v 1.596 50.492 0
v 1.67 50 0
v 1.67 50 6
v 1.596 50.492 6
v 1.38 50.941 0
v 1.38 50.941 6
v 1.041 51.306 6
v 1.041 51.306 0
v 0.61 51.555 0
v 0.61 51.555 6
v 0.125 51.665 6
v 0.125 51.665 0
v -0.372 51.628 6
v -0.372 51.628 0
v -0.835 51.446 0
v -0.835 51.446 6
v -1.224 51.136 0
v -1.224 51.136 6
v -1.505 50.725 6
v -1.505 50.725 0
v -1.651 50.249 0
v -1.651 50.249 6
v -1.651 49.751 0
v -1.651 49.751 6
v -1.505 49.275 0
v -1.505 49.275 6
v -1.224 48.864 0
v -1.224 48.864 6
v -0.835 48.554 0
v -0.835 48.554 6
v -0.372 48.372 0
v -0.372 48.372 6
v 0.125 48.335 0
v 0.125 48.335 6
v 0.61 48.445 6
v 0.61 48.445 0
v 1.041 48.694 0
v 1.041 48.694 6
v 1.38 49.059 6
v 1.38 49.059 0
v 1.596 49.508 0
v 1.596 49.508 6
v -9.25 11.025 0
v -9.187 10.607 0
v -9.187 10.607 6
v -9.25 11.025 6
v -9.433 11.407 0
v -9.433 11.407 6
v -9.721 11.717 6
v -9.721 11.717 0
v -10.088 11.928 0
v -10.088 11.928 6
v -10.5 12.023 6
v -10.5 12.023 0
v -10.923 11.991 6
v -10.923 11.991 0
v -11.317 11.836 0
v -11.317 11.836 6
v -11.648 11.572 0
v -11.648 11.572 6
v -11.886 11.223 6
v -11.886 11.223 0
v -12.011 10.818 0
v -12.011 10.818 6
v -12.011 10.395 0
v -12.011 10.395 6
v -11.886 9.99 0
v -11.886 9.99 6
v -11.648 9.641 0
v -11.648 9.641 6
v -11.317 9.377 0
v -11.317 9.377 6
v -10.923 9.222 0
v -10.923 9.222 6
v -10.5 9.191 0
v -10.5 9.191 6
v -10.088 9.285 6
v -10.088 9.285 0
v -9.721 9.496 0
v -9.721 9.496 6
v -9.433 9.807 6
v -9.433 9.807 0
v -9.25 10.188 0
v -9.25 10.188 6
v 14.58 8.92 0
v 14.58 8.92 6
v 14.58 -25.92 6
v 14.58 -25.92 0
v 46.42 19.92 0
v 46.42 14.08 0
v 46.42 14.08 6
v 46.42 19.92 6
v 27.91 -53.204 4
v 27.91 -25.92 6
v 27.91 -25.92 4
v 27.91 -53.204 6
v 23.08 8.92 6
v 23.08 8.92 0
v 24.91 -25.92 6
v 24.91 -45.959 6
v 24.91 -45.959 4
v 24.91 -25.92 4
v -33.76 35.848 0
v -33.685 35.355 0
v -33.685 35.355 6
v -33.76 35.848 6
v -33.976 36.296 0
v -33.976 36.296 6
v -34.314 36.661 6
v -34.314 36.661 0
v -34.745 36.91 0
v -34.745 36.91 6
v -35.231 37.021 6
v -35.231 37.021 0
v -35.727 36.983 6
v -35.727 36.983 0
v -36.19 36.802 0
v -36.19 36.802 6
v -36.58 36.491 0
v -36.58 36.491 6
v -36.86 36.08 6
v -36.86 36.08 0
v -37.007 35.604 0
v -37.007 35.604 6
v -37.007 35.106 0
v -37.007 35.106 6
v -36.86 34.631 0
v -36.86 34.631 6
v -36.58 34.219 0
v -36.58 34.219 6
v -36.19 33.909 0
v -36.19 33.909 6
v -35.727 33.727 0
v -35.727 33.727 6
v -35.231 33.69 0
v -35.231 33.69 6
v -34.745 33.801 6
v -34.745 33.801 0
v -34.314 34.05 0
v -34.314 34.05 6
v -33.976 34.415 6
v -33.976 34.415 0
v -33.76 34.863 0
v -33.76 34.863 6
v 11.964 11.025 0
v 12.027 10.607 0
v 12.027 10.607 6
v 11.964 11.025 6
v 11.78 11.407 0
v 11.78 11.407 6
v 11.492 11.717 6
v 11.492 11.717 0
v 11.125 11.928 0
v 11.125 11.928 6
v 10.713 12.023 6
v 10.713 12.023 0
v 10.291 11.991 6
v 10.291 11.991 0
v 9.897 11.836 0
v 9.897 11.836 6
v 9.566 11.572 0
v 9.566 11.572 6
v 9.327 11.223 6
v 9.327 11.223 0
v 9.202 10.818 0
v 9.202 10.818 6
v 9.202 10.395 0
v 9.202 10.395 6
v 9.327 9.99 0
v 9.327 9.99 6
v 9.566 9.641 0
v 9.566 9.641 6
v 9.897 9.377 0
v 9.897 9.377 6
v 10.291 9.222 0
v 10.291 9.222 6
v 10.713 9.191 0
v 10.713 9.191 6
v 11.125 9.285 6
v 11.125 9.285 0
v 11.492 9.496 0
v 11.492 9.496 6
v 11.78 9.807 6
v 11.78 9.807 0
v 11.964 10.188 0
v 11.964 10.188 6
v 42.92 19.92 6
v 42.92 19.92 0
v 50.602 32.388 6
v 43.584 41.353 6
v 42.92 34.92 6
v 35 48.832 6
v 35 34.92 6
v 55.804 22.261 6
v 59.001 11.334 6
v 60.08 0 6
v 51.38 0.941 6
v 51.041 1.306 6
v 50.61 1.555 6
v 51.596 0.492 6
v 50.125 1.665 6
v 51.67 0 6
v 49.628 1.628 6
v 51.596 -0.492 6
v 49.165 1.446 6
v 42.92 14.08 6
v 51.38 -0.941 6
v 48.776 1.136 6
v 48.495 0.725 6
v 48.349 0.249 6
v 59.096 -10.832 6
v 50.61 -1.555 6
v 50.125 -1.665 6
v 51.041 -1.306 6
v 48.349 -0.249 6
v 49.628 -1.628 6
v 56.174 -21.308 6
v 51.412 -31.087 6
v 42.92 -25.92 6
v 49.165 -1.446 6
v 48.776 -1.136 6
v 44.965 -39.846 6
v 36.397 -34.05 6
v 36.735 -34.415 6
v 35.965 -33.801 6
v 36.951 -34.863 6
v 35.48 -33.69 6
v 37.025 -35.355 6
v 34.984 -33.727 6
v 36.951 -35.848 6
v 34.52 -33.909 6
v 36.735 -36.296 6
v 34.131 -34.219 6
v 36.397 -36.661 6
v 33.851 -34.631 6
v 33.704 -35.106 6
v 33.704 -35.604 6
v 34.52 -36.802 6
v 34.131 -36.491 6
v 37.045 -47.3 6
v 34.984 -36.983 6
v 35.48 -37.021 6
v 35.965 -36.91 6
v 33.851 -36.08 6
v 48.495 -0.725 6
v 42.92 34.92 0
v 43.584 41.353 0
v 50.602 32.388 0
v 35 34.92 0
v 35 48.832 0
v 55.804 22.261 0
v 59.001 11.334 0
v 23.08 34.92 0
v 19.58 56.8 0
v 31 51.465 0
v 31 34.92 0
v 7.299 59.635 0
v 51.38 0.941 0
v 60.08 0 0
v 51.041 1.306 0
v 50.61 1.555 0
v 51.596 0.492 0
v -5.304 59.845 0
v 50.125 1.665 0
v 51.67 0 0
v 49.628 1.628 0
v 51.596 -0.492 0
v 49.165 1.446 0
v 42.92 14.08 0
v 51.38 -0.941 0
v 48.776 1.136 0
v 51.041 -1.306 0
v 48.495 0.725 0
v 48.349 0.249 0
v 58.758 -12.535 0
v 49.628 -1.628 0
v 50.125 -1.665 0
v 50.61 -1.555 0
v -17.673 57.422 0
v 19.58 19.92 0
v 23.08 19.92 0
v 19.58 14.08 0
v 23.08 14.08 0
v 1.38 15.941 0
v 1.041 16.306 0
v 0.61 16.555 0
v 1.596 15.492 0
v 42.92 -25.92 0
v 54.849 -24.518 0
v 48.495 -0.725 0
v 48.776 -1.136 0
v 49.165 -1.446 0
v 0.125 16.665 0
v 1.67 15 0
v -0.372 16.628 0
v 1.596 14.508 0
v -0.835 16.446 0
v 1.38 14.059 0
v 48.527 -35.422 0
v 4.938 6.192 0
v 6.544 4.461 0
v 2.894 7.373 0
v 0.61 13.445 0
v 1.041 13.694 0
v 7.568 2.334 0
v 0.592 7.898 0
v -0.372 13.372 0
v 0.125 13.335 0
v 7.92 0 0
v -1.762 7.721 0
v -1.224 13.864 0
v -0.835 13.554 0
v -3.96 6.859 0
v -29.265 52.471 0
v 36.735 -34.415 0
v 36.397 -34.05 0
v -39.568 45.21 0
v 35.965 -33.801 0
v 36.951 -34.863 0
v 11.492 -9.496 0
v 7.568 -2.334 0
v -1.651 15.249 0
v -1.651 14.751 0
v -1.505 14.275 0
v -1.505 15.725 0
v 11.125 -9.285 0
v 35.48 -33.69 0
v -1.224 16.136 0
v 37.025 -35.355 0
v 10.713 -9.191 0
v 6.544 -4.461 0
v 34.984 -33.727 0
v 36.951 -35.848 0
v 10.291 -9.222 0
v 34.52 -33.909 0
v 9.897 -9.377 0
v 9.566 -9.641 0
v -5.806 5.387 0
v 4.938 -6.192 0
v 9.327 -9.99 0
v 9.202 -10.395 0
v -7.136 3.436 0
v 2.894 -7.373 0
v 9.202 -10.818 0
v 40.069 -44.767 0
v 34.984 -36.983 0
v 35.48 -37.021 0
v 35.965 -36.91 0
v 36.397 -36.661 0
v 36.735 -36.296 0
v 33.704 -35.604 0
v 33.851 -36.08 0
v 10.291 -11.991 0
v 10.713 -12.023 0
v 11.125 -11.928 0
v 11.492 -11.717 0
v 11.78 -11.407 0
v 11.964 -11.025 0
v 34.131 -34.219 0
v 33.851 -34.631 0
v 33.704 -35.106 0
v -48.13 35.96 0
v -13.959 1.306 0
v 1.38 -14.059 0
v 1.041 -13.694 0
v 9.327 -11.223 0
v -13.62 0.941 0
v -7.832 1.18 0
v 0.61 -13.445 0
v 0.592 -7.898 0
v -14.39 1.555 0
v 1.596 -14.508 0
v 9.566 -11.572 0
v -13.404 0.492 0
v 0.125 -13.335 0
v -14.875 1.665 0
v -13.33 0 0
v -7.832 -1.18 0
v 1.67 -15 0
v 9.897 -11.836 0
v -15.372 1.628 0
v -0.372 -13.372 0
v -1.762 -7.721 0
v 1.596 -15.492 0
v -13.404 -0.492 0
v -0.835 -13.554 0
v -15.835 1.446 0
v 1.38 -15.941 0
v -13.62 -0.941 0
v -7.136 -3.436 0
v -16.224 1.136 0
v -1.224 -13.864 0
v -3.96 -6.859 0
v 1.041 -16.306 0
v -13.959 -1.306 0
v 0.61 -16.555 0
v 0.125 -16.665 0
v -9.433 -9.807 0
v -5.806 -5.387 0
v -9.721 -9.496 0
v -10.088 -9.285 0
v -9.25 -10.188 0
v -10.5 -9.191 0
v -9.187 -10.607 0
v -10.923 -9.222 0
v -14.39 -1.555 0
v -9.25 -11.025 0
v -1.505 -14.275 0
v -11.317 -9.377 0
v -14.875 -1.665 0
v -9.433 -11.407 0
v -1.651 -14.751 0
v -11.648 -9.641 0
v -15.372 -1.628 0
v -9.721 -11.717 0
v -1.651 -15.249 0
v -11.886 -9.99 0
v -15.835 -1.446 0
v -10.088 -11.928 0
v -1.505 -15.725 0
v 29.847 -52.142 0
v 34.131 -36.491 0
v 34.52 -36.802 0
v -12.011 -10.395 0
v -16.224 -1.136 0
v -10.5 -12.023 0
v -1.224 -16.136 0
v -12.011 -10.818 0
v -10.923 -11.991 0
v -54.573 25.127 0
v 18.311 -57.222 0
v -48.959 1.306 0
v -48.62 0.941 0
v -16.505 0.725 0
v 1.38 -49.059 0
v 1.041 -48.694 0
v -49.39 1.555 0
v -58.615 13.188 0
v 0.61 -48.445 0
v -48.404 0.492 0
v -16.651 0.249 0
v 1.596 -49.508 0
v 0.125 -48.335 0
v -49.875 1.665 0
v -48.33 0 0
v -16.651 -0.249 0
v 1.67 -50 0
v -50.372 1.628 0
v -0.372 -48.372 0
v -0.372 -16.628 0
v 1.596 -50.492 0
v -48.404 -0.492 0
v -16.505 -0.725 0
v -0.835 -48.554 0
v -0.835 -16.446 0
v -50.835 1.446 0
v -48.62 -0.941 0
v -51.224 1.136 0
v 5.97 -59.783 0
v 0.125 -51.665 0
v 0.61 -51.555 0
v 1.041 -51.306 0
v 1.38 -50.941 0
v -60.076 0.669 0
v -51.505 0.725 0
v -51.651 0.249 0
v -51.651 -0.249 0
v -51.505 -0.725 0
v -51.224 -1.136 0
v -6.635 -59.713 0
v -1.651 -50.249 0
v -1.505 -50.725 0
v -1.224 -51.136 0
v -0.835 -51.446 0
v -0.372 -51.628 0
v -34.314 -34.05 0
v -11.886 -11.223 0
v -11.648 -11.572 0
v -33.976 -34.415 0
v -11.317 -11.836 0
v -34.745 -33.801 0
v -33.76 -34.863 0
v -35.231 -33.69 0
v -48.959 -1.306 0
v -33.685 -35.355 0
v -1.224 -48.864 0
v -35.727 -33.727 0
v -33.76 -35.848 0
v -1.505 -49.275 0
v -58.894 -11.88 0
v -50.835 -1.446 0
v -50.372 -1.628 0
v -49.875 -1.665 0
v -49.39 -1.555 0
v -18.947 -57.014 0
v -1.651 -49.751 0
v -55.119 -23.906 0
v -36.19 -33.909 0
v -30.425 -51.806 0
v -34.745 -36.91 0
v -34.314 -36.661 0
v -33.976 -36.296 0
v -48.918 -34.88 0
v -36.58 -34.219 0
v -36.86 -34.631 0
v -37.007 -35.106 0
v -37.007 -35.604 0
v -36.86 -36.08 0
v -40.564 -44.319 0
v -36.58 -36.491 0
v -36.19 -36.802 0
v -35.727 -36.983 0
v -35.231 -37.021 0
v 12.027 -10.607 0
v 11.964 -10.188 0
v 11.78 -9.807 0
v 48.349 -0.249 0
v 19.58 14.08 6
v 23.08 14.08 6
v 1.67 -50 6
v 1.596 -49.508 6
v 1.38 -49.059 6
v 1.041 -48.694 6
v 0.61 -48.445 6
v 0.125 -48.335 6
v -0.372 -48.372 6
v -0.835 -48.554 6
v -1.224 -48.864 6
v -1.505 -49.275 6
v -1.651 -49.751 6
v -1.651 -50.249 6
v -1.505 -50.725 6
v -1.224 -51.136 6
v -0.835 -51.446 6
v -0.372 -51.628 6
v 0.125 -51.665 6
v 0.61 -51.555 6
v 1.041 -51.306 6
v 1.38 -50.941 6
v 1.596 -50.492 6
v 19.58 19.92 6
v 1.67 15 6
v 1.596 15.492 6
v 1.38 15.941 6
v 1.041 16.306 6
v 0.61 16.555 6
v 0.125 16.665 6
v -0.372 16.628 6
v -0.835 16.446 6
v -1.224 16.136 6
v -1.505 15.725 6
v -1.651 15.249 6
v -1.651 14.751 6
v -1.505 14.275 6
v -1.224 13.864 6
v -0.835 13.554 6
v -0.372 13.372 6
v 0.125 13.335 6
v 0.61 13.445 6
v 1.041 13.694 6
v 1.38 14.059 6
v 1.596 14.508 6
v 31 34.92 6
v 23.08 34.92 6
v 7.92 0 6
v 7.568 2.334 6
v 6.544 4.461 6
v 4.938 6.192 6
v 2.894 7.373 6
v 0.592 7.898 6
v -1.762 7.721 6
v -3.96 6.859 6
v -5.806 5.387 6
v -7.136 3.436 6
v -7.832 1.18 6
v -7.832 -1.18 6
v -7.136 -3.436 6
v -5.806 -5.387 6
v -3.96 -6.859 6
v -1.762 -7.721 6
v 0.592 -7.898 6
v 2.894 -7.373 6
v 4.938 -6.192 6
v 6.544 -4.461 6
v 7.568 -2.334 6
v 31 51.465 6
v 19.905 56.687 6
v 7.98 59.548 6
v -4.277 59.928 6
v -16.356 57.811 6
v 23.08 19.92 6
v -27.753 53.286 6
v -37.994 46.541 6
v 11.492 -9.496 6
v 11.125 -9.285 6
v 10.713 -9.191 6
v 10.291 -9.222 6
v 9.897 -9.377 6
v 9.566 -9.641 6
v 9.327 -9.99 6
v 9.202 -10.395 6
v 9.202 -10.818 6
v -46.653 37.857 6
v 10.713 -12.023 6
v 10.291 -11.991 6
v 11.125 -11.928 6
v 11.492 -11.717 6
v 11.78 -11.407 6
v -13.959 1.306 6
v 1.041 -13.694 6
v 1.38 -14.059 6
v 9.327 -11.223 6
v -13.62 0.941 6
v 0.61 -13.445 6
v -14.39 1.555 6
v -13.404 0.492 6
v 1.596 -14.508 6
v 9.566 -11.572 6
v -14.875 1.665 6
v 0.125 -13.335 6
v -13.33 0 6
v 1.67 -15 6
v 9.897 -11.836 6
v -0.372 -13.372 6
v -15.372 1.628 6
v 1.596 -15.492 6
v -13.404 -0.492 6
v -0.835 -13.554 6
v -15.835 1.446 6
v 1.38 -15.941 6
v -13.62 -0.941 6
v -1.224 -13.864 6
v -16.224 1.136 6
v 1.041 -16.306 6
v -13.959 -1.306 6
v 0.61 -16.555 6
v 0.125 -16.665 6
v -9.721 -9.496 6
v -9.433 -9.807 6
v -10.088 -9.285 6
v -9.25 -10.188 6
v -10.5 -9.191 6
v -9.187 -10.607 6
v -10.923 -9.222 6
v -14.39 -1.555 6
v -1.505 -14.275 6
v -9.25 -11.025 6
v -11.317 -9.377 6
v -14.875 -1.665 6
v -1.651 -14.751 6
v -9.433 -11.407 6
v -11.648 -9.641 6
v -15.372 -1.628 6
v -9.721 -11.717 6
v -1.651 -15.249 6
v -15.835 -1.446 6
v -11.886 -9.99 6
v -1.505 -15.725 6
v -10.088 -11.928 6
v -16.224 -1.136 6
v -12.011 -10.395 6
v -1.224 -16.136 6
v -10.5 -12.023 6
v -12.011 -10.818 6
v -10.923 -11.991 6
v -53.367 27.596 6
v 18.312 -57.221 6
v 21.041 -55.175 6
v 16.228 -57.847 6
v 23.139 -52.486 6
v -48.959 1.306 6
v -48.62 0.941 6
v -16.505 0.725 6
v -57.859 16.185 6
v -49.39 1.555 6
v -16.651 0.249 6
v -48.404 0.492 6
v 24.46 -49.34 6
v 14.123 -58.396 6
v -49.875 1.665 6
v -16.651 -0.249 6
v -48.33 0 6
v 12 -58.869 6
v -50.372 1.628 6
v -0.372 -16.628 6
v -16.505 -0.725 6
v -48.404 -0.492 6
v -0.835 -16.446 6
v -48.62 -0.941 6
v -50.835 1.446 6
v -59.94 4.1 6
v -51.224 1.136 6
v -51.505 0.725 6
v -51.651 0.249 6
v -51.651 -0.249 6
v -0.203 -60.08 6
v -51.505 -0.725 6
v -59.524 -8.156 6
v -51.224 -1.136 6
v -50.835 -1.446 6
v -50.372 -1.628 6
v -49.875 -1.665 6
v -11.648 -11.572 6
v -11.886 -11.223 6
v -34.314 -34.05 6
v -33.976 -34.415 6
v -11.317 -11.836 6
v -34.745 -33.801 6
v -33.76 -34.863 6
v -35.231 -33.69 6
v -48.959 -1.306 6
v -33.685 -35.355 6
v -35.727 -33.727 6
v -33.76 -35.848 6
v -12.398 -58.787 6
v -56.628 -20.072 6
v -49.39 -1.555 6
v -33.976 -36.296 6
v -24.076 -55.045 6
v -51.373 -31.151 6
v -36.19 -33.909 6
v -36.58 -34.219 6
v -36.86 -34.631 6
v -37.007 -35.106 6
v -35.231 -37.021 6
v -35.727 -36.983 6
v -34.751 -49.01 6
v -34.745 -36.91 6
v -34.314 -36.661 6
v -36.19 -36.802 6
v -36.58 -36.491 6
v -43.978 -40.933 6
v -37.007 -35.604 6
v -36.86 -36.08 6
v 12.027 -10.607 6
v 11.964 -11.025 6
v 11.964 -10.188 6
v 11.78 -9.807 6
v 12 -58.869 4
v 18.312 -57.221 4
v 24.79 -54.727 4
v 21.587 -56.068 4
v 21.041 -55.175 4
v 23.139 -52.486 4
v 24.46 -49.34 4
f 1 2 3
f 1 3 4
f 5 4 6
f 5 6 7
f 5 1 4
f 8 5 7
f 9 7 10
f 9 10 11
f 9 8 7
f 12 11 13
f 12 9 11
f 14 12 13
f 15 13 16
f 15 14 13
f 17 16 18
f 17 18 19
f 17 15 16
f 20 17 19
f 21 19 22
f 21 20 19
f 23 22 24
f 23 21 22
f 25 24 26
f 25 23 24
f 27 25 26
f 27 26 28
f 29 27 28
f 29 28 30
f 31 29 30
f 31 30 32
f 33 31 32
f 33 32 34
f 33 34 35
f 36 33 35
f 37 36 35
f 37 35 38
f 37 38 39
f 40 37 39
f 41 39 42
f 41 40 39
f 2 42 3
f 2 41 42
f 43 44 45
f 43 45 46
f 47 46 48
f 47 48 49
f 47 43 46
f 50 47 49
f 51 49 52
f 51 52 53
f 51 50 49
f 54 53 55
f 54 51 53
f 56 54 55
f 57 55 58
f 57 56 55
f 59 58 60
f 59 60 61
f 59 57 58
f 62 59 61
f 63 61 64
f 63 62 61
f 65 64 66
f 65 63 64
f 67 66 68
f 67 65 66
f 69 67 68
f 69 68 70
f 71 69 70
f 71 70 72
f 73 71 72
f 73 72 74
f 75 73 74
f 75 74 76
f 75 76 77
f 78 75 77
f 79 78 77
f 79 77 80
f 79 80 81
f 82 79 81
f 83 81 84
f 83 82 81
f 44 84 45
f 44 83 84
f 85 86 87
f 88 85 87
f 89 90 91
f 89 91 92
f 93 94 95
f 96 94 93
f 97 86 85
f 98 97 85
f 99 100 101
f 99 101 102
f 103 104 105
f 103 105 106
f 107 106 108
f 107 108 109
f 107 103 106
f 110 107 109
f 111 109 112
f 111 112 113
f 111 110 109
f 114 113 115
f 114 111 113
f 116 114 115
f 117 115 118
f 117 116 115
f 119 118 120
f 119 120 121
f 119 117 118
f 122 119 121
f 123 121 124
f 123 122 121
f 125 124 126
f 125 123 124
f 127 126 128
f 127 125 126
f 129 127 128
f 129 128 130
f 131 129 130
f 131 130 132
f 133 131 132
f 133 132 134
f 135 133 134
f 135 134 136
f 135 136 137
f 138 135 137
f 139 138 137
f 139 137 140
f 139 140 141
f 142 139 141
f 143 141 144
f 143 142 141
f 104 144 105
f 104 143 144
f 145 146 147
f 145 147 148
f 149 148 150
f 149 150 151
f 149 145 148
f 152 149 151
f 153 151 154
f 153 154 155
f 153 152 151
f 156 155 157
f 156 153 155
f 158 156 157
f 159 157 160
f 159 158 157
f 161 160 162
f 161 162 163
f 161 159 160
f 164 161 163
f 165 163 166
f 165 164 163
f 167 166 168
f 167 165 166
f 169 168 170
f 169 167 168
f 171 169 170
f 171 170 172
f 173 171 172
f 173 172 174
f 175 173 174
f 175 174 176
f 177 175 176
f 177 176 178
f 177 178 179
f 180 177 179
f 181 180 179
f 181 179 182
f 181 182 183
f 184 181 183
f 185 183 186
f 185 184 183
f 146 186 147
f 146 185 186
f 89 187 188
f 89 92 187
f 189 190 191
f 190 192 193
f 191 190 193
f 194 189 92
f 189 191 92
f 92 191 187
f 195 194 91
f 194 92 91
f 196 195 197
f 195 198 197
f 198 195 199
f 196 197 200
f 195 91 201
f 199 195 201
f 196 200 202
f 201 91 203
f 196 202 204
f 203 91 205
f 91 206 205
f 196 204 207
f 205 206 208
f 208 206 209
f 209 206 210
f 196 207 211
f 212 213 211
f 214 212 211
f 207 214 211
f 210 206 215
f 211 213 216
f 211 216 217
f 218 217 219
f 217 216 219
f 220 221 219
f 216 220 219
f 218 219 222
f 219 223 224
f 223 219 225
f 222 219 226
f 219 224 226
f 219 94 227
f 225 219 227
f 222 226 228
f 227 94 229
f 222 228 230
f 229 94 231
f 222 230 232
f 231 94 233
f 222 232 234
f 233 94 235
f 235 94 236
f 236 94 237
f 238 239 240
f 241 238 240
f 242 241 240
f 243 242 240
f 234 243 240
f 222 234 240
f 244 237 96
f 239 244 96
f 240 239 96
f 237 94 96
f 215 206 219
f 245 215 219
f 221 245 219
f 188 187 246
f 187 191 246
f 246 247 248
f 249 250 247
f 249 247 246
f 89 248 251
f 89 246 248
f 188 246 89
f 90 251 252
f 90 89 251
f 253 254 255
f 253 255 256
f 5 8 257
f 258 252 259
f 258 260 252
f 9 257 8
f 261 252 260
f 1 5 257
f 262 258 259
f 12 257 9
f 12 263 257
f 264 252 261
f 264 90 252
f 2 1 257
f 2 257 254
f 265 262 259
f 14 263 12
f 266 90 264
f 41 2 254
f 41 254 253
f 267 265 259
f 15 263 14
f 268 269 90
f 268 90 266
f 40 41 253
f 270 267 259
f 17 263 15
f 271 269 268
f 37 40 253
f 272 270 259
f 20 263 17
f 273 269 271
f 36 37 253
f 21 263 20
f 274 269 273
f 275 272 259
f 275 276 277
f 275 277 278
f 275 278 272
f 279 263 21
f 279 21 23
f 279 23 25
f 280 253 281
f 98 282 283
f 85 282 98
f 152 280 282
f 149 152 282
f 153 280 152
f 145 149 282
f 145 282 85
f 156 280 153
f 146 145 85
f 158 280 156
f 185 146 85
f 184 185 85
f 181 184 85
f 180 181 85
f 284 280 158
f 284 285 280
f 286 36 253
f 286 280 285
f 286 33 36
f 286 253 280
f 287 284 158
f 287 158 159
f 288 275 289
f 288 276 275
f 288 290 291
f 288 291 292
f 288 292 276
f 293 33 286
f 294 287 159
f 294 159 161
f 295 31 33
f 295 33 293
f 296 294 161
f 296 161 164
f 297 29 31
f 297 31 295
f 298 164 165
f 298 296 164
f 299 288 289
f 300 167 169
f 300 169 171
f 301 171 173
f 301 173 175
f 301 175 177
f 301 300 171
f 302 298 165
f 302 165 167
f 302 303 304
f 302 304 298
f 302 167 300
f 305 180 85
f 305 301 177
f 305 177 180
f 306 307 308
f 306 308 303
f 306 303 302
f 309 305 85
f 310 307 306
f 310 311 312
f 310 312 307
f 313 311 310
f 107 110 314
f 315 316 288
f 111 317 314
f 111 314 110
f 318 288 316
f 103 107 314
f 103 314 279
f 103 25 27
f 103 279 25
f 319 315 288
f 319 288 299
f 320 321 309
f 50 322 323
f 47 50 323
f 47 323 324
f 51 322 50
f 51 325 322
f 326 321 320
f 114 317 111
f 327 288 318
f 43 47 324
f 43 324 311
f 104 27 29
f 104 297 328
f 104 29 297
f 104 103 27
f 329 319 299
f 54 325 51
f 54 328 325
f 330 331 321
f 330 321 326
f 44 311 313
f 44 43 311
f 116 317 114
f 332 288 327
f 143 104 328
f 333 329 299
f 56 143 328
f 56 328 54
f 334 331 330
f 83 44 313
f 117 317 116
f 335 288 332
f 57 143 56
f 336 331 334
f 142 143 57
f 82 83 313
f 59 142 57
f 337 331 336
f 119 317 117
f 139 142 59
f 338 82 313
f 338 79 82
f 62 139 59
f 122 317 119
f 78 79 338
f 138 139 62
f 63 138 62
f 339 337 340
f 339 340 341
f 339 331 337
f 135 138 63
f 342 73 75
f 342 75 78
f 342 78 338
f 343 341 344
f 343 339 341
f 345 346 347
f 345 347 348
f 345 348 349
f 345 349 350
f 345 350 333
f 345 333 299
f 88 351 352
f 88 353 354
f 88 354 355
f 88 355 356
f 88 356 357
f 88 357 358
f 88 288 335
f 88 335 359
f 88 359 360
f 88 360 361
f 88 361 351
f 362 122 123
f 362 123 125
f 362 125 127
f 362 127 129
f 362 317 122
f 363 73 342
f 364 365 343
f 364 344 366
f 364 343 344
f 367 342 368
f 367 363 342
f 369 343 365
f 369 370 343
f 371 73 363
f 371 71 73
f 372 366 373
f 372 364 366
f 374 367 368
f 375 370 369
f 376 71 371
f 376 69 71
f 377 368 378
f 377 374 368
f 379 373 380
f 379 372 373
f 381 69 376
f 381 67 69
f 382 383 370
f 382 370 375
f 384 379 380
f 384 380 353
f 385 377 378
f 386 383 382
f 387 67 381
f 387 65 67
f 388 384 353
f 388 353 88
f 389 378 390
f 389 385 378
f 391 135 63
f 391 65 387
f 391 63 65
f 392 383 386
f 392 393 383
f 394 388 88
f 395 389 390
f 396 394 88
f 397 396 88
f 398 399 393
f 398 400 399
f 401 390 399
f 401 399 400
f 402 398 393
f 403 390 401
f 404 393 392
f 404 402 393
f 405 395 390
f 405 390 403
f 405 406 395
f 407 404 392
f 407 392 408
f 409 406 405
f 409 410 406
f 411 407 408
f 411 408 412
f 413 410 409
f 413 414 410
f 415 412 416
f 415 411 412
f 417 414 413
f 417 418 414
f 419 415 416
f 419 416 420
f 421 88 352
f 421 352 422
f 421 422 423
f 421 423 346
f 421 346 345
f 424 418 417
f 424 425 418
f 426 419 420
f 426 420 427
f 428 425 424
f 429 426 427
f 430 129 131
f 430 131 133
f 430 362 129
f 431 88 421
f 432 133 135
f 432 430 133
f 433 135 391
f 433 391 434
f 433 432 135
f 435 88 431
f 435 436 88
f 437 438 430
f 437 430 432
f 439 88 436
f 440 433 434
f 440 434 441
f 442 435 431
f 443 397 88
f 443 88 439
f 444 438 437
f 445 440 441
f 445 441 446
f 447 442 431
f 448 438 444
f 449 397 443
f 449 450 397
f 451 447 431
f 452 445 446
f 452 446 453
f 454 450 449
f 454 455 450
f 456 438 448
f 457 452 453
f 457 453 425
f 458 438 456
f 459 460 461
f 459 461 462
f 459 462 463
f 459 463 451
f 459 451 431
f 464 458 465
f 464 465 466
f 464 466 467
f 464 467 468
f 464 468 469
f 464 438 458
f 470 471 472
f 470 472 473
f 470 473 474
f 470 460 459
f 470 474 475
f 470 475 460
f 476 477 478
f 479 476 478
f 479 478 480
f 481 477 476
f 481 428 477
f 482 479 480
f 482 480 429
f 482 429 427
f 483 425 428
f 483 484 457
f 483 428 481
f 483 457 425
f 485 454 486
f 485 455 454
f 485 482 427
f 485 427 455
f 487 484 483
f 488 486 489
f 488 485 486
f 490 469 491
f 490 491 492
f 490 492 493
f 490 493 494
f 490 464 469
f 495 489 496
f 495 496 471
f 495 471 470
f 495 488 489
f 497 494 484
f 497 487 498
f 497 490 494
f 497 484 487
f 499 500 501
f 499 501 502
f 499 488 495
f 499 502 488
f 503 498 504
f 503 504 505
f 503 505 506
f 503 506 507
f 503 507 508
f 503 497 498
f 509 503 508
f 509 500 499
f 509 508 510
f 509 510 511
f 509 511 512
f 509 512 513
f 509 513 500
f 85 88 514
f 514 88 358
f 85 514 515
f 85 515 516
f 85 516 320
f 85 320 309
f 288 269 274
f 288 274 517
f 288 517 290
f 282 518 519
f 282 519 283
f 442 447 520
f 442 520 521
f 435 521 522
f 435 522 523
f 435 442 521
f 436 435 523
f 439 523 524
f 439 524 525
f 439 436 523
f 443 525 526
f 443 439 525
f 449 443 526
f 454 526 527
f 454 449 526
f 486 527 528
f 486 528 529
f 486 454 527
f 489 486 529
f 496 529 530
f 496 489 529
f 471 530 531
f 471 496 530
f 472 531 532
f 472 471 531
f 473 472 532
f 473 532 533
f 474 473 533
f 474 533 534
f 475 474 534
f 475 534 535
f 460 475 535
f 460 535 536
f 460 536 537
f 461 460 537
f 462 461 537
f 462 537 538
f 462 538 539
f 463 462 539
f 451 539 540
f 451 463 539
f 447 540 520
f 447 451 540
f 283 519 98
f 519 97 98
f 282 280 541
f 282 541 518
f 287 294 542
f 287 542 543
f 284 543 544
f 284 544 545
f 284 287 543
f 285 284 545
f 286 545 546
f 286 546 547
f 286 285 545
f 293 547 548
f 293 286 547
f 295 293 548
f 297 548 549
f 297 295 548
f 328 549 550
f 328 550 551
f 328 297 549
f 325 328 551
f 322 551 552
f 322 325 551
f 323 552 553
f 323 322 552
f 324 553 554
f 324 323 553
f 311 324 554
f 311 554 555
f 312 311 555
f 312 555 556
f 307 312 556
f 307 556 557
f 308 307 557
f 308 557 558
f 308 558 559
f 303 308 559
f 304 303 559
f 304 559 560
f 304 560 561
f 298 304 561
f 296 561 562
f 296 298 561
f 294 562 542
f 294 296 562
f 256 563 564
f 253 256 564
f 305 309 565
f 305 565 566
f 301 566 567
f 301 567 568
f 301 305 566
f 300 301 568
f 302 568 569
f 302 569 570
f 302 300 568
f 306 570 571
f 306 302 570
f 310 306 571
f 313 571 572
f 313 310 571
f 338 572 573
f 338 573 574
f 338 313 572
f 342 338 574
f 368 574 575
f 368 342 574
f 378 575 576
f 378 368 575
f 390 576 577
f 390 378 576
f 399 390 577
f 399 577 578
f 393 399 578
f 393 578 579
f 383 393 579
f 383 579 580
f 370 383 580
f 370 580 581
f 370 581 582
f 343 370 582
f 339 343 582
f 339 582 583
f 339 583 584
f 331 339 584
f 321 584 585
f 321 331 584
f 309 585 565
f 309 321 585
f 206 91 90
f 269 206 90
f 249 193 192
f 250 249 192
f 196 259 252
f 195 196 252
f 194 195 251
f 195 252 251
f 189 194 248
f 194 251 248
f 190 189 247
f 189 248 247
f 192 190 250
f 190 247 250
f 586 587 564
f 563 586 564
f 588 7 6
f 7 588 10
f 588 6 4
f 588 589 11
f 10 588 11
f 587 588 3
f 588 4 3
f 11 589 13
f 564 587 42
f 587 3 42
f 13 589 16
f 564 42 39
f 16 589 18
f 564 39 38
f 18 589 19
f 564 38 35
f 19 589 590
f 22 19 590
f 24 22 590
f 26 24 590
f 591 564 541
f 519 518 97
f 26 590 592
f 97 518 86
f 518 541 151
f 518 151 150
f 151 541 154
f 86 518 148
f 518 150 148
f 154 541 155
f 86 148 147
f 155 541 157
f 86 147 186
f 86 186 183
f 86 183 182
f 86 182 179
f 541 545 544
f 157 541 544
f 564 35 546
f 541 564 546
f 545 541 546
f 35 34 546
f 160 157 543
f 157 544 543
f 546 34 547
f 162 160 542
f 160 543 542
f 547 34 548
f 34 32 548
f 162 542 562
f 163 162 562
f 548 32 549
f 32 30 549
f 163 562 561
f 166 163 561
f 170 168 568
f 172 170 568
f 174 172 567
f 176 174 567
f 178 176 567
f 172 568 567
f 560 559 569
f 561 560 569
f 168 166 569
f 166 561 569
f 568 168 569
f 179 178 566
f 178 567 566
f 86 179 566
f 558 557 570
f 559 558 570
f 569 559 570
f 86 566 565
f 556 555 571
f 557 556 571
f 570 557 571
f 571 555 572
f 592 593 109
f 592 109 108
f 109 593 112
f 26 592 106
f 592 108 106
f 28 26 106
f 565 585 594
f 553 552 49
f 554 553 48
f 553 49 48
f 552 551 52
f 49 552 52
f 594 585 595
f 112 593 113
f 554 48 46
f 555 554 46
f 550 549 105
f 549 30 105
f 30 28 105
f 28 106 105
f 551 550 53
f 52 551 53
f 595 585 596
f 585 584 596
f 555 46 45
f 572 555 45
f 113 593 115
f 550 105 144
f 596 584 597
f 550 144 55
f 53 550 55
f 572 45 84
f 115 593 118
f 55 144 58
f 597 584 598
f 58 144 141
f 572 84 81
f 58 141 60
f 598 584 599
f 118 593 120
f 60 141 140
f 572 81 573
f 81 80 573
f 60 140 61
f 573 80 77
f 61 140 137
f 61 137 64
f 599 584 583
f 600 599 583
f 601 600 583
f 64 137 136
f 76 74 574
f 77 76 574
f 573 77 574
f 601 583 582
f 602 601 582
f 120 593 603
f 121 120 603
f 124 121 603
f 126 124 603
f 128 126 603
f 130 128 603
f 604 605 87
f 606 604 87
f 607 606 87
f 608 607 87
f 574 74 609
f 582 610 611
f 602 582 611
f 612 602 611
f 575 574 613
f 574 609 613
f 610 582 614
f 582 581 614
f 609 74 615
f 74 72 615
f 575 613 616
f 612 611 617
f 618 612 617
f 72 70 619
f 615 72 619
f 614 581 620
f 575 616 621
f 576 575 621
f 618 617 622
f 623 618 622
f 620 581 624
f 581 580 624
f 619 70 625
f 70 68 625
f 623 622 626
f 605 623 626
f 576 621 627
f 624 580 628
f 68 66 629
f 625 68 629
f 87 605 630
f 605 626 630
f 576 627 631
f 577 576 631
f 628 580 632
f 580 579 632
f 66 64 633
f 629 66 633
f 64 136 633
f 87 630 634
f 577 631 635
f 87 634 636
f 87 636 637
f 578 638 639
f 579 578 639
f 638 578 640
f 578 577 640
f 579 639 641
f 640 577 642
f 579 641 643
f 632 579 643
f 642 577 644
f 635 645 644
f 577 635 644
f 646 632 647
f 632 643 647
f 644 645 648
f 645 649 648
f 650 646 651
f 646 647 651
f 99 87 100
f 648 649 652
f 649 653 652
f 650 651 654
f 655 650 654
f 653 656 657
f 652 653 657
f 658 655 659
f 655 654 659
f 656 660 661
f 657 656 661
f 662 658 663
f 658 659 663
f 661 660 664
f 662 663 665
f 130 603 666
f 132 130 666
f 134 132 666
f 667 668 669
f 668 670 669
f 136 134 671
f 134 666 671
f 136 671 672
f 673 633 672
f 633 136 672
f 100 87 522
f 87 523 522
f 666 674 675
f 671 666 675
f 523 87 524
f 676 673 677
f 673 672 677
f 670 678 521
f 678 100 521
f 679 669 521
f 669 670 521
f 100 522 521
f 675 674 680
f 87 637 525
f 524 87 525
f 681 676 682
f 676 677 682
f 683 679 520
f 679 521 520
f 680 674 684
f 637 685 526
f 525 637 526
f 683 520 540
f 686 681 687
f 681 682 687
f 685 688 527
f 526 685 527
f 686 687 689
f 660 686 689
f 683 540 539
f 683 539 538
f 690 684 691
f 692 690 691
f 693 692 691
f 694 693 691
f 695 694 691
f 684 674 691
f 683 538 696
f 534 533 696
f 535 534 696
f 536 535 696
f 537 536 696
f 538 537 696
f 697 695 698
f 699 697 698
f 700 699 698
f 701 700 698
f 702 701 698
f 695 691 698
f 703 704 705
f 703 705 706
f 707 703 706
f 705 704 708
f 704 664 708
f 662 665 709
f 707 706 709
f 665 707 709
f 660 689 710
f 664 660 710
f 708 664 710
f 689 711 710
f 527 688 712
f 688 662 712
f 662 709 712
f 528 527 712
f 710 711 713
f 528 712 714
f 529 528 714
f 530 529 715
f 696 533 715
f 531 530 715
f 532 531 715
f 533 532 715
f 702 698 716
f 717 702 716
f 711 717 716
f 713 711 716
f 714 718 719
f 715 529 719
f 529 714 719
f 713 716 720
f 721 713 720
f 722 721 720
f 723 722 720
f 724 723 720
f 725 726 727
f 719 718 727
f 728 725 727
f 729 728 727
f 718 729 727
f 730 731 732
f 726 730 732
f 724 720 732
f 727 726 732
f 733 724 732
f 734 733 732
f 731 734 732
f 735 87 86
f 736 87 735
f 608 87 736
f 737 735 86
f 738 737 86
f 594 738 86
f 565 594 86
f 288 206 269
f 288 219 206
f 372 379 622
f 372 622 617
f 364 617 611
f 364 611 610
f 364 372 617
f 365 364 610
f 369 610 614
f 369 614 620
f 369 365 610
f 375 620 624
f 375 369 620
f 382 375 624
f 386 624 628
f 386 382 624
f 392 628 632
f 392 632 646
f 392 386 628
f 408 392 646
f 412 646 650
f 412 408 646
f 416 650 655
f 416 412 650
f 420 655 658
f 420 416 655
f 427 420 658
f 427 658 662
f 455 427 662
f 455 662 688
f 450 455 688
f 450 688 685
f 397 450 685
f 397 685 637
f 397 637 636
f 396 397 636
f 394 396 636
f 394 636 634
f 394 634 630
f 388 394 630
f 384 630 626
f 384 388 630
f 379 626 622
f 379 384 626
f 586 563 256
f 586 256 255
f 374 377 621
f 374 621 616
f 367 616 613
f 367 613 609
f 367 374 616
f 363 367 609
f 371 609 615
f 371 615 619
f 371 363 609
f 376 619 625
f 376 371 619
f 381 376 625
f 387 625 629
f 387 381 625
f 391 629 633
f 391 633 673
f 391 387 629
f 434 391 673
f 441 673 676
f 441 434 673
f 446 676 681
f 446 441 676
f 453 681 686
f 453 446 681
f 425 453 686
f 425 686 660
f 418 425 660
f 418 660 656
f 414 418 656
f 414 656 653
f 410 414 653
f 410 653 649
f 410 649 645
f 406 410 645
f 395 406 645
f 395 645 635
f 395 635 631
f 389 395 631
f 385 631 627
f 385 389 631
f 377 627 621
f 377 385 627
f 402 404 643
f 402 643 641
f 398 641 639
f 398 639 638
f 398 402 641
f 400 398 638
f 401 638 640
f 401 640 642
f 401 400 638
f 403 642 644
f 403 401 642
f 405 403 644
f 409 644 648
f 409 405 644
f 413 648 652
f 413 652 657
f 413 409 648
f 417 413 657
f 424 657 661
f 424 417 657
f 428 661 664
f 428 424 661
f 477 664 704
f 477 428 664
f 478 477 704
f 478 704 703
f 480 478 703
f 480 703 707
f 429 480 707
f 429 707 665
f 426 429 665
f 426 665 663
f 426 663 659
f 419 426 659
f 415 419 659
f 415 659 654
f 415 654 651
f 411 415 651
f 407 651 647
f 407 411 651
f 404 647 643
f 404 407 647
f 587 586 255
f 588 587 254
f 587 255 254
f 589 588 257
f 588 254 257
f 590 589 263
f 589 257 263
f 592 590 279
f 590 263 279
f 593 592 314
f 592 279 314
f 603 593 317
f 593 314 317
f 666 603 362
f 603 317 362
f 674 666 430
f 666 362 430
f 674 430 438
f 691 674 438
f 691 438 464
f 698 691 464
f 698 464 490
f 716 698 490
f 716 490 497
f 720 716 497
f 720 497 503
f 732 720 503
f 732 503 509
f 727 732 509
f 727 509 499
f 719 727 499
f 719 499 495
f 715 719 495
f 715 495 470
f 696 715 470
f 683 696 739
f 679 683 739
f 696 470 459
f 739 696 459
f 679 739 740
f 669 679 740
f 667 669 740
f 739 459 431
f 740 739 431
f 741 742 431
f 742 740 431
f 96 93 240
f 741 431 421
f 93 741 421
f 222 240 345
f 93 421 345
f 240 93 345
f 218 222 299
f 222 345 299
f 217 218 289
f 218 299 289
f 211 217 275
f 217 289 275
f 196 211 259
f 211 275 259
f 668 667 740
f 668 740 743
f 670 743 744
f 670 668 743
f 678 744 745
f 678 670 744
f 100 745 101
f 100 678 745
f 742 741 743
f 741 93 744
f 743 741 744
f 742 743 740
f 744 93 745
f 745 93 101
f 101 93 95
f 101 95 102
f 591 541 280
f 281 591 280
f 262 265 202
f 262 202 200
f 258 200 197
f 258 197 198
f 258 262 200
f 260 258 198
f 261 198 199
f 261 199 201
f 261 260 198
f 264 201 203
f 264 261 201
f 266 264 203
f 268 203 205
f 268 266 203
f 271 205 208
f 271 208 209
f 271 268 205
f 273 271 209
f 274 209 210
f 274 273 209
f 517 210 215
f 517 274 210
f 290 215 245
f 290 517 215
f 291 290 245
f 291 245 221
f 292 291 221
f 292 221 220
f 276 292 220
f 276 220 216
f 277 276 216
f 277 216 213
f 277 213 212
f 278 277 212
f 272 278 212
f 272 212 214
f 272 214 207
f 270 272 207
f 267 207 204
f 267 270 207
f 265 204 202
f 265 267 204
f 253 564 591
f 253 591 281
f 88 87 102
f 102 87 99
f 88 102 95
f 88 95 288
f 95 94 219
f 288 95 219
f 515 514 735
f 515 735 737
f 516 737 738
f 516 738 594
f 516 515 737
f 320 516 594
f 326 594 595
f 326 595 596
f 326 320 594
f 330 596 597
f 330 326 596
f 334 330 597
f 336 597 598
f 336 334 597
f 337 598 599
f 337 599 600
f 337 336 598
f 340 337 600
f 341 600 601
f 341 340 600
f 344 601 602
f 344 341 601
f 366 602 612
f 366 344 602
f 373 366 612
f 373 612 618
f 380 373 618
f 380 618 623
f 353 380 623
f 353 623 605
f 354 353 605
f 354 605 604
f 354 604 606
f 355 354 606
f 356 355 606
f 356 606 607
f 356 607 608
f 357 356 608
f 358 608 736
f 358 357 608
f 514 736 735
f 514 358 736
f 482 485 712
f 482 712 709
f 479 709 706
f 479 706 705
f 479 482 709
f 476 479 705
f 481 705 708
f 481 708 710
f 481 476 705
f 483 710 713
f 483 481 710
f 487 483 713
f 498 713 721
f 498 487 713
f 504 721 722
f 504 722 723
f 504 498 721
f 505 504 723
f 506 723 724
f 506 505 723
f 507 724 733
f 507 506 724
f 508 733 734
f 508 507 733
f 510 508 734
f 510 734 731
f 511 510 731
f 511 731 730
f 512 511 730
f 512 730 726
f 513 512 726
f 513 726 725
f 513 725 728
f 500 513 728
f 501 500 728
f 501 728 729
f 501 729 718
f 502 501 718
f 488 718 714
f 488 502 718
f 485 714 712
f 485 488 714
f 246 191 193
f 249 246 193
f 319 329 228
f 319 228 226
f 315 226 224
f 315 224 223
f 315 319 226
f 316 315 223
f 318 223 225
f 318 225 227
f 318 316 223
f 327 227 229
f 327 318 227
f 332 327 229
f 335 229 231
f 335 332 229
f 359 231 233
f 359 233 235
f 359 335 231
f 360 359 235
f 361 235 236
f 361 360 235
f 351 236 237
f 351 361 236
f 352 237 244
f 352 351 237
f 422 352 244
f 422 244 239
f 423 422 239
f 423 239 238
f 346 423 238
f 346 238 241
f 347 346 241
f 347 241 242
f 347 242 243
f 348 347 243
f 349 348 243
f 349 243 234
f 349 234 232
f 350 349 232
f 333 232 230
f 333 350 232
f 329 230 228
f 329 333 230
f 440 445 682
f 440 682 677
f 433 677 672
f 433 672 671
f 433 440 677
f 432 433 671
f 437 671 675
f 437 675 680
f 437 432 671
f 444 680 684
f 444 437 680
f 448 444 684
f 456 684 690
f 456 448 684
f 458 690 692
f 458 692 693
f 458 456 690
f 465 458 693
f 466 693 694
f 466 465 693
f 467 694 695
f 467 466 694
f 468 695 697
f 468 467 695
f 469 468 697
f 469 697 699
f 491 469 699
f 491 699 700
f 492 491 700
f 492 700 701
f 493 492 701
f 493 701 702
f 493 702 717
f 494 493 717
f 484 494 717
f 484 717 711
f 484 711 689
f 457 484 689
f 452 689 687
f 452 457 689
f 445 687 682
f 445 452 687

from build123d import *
from build123d.topology import SkipClean

# Parameters (mm, degrees)
SKETCH1_R           = 60
SKETCH1_R_2         = 8
SKETCH1_R_3         = 1.75
SKETCH1_R_4         = 1.5
BOSS_EXTRUDE1_DEPTH = 6
CUT_EXTRUDE1_DEPTH  = 86.064681273
MOVE_FACE1_BY       = 0.08
MOVE_FACE1_2_BY     = 0.08
MOVE_FACE1_3_BY     = 0.08
MOVE_FACE1_4_BY     = 0.08
MOVE_FACE1_5_BY     = 0.08
MOVE_FACE1_6_BY     = 0.08
MOVE_FACE1_7_BY     = 0.08
MOVE_FACE1_8_BY     = 0.08
MOVE_FACE1_9_BY     = 0.08
MOVE_FACE1_10_BY    = 0.08
MOVE_FACE1_11_BY    = 0.08
MOVE_FACE1_12_BY    = 0.08
MOVE_FACE1_13_BY    = 0.08
MOVE_FACE1_14_BY    = 0.08
MOVE_FACE1_15_BY    = 0.08
MOVE_FACE1_16_BY    = 0.08
MOVE_FACE1_17_BY    = 0.08
MOVE_FACE1_18_BY    = 0.08
MOVE_FACE1_19_BY    = 0.08
MOVE_FACE1_20_BY    = 0.08
MOVE_FACE1_21_BY    = 0.08
MOVE_FACE1_22_BY    = 0.08
MOVE_FACE1_23_BY    = 0.08
MOVE_FACE1_24_BY    = 0.08
MOVE_FACE1_25_BY    = 0.08
MOVE_FACE1_26_BY    = 0.08
MOVE_FACE1_27_BY    = 0.08
MOVE_FACE1_28_BY    = 0.08
MOVE_FACE1_29_BY    = 0.08
MOVE_FACE1_30_BY    = 0.08
CUT_EXTRUDE2_DEPTH  = 2
SKETCH4_W           = 4
SKETCH4_H           = 40
CUT_EXTRUDE3_DEPTH  = 86.177536945


with BuildPart() as part:
    # Sketch1 → Boss-Extrude1 (new body)
    with BuildSketch(Plane.XY):
        Circle(SKETCH1_R)
        Circle(SKETCH1_R_2, mode=Mode.SUBTRACT)
        with Locations((0, -15)):
            Circle(SKETCH1_R_3, mode=Mode.SUBTRACT)
        with Locations((10.606601718, -10.606601718)):
            Circle(SKETCH1_R_4, mode=Mode.SUBTRACT)
        with Locations((0, -50)):
            Circle(SKETCH1_R_3, mode=Mode.SUBTRACT)
        with Locations((-15, 0)):
            Circle(SKETCH1_R_3, mode=Mode.SUBTRACT)
        with Locations((-10.606601718, -10.606601718)):
            Circle(SKETCH1_R_4, mode=Mode.SUBTRACT)
        with Locations((0, 15)):
            Circle(SKETCH1_R_3, mode=Mode.SUBTRACT)
        with Locations((-10.606601718, 10.606601718)):
            Circle(SKETCH1_R_4, mode=Mode.SUBTRACT)
        with Locations((10.606601718, 10.606601718)):
            Circle(SKETCH1_R_4, mode=Mode.SUBTRACT)
        with Locations((-35.355339059, -35.355339059)):
            Circle(SKETCH1_R_3, mode=Mode.SUBTRACT)
        with Locations((-50, 0)):
            Circle(SKETCH1_R_3, mode=Mode.SUBTRACT)
        with Locations((-35.355339059, 35.355339059)):
            Circle(SKETCH1_R_3, mode=Mode.SUBTRACT)
        with Locations((0, 50)):
            Circle(SKETCH1_R_3, mode=Mode.SUBTRACT)
        with Locations((50, 0)):
            Circle(SKETCH1_R_3, mode=Mode.SUBTRACT)
        with Locations((35.355339059, -35.355339059)):
            Circle(SKETCH1_R_3, mode=Mode.SUBTRACT)
    extrude(amount=BOSS_EXTRUDE1_DEPTH)

    # Sketch2 → Cut-Extrude1 (cut, through all)
    with BuildSketch(Plane.XY.offset(6)):
        Polygon((14.5, -26), (43, -26), (43, 14), (46.5, 14), (46.5, 20), (43, 20), (43, 35), (23, 35), (23, 20), (19.5, 20), (19.5, 14), (23, 14), (23, 9), (14.5, 9), align=None)
    extrude(amount=-CUT_EXTRUDE1_DEPTH, mode=Mode.SUBTRACT)

    # Move Face1: a curved face moved outward by 0.08
    add(Solid.thicken(part.faces().sort_by_distance((-60, 0, 3))[0], MOVE_FACE1_BY))

    # Move Face1 2: a face moved outward by 0.08
    extrude(part.faces().sort_by_distance((23, 11.5, 3))[0], amount=MOVE_FACE1_2_BY, dir=(1, 0, 0))

    # Move Face1 3: a curved face moved outward by 0.08
    add(Solid.thicken(part.faces().sort_by_distance((-8, 0, 3))[0], MOVE_FACE1_3_BY))

    # Move Face1 4: a curved face moved outward by 0.08
    add(Solid.thicken(part.faces().sort_by_distance((-1.75, -15, 3))[0], MOVE_FACE1_4_BY))

    # Move Face1 5: a curved face moved outward by 0.08
    add(Solid.thicken(part.faces().sort_by_distance((9.106601718, -10.606601718, 3))[0], MOVE_FACE1_5_BY))

    # Move Face1 6: a curved face moved outward by 0.08
    add(Solid.thicken(part.faces().sort_by_distance((-1.75, -50, 3))[0], MOVE_FACE1_6_BY))

    # Move Face1 7: a curved face moved outward by 0.08
    add(Solid.thicken(part.faces().sort_by_distance((-16.75, 0, 3))[0], MOVE_FACE1_7_BY))

    # Move Face1 8: a curved face moved outward by 0.08
    add(Solid.thicken(part.faces().sort_by_distance((-12.106601718, -10.606601718, 3))[0], MOVE_FACE1_8_BY))

    # Move Face1 9: a curved face moved outward by 0.08
    add(Solid.thicken(part.faces().sort_by_distance((-1.75, 15, 3))[0], MOVE_FACE1_9_BY))

    # Move Face1 10: a curved face moved outward by 0.08
    add(Solid.thicken(part.faces().sort_by_distance((-12.106601718, 10.606601718, 3))[0], MOVE_FACE1_10_BY))

    # Move Face1 11: a curved face moved outward by 0.08
    add(Solid.thicken(part.faces().sort_by_distance((9.106601718, 10.606601718, 3))[0], MOVE_FACE1_11_BY))

    # Move Face1 12: a curved face moved outward by 0.08
    add(Solid.thicken(part.faces().sort_by_distance((-37.105339059, -35.355339059, 3))[0], MOVE_FACE1_12_BY))

    # Move Face1 13: a curved face moved outward by 0.08
    add(Solid.thicken(part.faces().sort_by_distance((-51.75, 0, 3))[0], MOVE_FACE1_13_BY))

    # Move Face1 14: a curved face moved outward by 0.08
    add(Solid.thicken(part.faces().sort_by_distance((-37.105339059, 35.355339059, 3))[0], MOVE_FACE1_14_BY))

    # Move Face1 15: a curved face moved outward by 0.08
    add(Solid.thicken(part.faces().sort_by_distance((-1.75, 50, 3))[0], MOVE_FACE1_15_BY))

    # Move Face1 16: a curved face moved outward by 0.08
    add(Solid.thicken(part.faces().sort_by_distance((48.25, 0, 3))[0], MOVE_FACE1_16_BY))

    # Move Face1 17: a curved face moved outward by 0.08
    add(Solid.thicken(part.faces().sort_by_distance((33.605339059, -35.355339059, 3))[0], MOVE_FACE1_17_BY))

    # Move Face1 18: a face moved outward by 0.08
    extrude(part.faces().sort_by_distance((23, 27.5, 3))[0], amount=MOVE_FACE1_18_BY, dir=(1, 0, 0))

    # Move Face1 19: a face moved outward by 0.08
    extrude(part.faces().sort_by_distance((18.75, 9, 3))[0], amount=MOVE_FACE1_19_BY, dir=(0, -1, 0))

    # Move Face1 20: a face moved outward by 0.08
    extrude(part.faces().sort_by_distance((21.25, 14, 3))[0], amount=MOVE_FACE1_20_BY, dir=(0, 1, 0))

    # Move Face1 21: a face moved outward by 0.08
    extrude(part.faces().sort_by_distance((21.25, 20, 3))[0], amount=MOVE_FACE1_21_BY, dir=(0, -1, 0))

    # Move Face1 22: a face moved outward by 0.08
    extrude(part.faces().sort_by_distance((33, 35, 3))[0], amount=MOVE_FACE1_22_BY, dir=(0, -1, 0))

    # Move Face1 23: a face moved outward by 0.08
    extrude(part.faces().sort_by_distance((28.75, -26, 3))[0], amount=MOVE_FACE1_23_BY, dir=(0, 1, 0))

    # Move Face1 24: a face moved outward by 0.08
    extrude(part.faces().sort_by_distance((43, -6, 3))[0], amount=MOVE_FACE1_24_BY, dir=(-1, 0, 0))

    # Move Face1 25: a face moved outward by 0.08
    extrude(part.faces().sort_by_distance((44.75, 14, 3))[0], amount=MOVE_FACE1_25_BY, dir=(0, 1, 0))

    # Move Face1 26: a face moved outward by 0.08
    extrude(part.faces().sort_by_distance((46.5, 17, 3))[0], amount=MOVE_FACE1_26_BY, dir=(-1, 0, 0))

    # Move Face1 27: a face moved outward by 0.08
    extrude(part.faces().sort_by_distance((44.75, 20, 3))[0], amount=MOVE_FACE1_27_BY, dir=(0, -1, 0))

    # Move Face1 28: a face moved outward by 0.08
    extrude(part.faces().sort_by_distance((43, 27.5, 3))[0], amount=MOVE_FACE1_28_BY, dir=(-1, 0, 0))

    # Move Face1 29: a face moved outward by 0.08
    extrude(part.faces().sort_by_distance((19.5, 17, 3))[0], amount=MOVE_FACE1_29_BY, dir=(1, 0, 0))

    # Move Face1 30: a face moved outward by 0.08
    extrude(part.faces().sort_by_distance((14.5, -8.5, 3))[0], amount=MOVE_FACE1_30_BY, dir=(1, 0, 0))

    # Sketch3 → Cut-Extrude2 (cut)
    with BuildSketch(Plane.XY.offset(6)):
        with BuildLine():
            Line((24.91040122, -45.959), (24.91040122, -25.92))
            Line((24.91040122, -25.92), (27.91040122, -25.92))
            Line((27.91040122, -25.92), (27.91040122, -58.86940122))
            Line((27.91040122, -58.86940122), (12, -58.86940122))
            ThreePointArc((12, -58.86940122), (21.12903225, -55.08803225), (24.91040122, -45.959))
        make_face()
    extrude(amount=-CUT_EXTRUDE2_DEPTH, mode=Mode.SUBTRACT)

    # Sketch4 → Cut-Extrude3 (cut, through all)
    with SkipClean():  # the faces are left unmerged after this step: merging them gives an invalid solid
        with BuildSketch(Plane.XY.offset(6)):
            with Locations((33, 34.92)):
                Rectangle(SKETCH4_W, SKETCH4_H)
        extrude(amount=-CUT_EXTRUDE3_DEPTH, mode=Mode.SUBTRACT)


solid = part.part
